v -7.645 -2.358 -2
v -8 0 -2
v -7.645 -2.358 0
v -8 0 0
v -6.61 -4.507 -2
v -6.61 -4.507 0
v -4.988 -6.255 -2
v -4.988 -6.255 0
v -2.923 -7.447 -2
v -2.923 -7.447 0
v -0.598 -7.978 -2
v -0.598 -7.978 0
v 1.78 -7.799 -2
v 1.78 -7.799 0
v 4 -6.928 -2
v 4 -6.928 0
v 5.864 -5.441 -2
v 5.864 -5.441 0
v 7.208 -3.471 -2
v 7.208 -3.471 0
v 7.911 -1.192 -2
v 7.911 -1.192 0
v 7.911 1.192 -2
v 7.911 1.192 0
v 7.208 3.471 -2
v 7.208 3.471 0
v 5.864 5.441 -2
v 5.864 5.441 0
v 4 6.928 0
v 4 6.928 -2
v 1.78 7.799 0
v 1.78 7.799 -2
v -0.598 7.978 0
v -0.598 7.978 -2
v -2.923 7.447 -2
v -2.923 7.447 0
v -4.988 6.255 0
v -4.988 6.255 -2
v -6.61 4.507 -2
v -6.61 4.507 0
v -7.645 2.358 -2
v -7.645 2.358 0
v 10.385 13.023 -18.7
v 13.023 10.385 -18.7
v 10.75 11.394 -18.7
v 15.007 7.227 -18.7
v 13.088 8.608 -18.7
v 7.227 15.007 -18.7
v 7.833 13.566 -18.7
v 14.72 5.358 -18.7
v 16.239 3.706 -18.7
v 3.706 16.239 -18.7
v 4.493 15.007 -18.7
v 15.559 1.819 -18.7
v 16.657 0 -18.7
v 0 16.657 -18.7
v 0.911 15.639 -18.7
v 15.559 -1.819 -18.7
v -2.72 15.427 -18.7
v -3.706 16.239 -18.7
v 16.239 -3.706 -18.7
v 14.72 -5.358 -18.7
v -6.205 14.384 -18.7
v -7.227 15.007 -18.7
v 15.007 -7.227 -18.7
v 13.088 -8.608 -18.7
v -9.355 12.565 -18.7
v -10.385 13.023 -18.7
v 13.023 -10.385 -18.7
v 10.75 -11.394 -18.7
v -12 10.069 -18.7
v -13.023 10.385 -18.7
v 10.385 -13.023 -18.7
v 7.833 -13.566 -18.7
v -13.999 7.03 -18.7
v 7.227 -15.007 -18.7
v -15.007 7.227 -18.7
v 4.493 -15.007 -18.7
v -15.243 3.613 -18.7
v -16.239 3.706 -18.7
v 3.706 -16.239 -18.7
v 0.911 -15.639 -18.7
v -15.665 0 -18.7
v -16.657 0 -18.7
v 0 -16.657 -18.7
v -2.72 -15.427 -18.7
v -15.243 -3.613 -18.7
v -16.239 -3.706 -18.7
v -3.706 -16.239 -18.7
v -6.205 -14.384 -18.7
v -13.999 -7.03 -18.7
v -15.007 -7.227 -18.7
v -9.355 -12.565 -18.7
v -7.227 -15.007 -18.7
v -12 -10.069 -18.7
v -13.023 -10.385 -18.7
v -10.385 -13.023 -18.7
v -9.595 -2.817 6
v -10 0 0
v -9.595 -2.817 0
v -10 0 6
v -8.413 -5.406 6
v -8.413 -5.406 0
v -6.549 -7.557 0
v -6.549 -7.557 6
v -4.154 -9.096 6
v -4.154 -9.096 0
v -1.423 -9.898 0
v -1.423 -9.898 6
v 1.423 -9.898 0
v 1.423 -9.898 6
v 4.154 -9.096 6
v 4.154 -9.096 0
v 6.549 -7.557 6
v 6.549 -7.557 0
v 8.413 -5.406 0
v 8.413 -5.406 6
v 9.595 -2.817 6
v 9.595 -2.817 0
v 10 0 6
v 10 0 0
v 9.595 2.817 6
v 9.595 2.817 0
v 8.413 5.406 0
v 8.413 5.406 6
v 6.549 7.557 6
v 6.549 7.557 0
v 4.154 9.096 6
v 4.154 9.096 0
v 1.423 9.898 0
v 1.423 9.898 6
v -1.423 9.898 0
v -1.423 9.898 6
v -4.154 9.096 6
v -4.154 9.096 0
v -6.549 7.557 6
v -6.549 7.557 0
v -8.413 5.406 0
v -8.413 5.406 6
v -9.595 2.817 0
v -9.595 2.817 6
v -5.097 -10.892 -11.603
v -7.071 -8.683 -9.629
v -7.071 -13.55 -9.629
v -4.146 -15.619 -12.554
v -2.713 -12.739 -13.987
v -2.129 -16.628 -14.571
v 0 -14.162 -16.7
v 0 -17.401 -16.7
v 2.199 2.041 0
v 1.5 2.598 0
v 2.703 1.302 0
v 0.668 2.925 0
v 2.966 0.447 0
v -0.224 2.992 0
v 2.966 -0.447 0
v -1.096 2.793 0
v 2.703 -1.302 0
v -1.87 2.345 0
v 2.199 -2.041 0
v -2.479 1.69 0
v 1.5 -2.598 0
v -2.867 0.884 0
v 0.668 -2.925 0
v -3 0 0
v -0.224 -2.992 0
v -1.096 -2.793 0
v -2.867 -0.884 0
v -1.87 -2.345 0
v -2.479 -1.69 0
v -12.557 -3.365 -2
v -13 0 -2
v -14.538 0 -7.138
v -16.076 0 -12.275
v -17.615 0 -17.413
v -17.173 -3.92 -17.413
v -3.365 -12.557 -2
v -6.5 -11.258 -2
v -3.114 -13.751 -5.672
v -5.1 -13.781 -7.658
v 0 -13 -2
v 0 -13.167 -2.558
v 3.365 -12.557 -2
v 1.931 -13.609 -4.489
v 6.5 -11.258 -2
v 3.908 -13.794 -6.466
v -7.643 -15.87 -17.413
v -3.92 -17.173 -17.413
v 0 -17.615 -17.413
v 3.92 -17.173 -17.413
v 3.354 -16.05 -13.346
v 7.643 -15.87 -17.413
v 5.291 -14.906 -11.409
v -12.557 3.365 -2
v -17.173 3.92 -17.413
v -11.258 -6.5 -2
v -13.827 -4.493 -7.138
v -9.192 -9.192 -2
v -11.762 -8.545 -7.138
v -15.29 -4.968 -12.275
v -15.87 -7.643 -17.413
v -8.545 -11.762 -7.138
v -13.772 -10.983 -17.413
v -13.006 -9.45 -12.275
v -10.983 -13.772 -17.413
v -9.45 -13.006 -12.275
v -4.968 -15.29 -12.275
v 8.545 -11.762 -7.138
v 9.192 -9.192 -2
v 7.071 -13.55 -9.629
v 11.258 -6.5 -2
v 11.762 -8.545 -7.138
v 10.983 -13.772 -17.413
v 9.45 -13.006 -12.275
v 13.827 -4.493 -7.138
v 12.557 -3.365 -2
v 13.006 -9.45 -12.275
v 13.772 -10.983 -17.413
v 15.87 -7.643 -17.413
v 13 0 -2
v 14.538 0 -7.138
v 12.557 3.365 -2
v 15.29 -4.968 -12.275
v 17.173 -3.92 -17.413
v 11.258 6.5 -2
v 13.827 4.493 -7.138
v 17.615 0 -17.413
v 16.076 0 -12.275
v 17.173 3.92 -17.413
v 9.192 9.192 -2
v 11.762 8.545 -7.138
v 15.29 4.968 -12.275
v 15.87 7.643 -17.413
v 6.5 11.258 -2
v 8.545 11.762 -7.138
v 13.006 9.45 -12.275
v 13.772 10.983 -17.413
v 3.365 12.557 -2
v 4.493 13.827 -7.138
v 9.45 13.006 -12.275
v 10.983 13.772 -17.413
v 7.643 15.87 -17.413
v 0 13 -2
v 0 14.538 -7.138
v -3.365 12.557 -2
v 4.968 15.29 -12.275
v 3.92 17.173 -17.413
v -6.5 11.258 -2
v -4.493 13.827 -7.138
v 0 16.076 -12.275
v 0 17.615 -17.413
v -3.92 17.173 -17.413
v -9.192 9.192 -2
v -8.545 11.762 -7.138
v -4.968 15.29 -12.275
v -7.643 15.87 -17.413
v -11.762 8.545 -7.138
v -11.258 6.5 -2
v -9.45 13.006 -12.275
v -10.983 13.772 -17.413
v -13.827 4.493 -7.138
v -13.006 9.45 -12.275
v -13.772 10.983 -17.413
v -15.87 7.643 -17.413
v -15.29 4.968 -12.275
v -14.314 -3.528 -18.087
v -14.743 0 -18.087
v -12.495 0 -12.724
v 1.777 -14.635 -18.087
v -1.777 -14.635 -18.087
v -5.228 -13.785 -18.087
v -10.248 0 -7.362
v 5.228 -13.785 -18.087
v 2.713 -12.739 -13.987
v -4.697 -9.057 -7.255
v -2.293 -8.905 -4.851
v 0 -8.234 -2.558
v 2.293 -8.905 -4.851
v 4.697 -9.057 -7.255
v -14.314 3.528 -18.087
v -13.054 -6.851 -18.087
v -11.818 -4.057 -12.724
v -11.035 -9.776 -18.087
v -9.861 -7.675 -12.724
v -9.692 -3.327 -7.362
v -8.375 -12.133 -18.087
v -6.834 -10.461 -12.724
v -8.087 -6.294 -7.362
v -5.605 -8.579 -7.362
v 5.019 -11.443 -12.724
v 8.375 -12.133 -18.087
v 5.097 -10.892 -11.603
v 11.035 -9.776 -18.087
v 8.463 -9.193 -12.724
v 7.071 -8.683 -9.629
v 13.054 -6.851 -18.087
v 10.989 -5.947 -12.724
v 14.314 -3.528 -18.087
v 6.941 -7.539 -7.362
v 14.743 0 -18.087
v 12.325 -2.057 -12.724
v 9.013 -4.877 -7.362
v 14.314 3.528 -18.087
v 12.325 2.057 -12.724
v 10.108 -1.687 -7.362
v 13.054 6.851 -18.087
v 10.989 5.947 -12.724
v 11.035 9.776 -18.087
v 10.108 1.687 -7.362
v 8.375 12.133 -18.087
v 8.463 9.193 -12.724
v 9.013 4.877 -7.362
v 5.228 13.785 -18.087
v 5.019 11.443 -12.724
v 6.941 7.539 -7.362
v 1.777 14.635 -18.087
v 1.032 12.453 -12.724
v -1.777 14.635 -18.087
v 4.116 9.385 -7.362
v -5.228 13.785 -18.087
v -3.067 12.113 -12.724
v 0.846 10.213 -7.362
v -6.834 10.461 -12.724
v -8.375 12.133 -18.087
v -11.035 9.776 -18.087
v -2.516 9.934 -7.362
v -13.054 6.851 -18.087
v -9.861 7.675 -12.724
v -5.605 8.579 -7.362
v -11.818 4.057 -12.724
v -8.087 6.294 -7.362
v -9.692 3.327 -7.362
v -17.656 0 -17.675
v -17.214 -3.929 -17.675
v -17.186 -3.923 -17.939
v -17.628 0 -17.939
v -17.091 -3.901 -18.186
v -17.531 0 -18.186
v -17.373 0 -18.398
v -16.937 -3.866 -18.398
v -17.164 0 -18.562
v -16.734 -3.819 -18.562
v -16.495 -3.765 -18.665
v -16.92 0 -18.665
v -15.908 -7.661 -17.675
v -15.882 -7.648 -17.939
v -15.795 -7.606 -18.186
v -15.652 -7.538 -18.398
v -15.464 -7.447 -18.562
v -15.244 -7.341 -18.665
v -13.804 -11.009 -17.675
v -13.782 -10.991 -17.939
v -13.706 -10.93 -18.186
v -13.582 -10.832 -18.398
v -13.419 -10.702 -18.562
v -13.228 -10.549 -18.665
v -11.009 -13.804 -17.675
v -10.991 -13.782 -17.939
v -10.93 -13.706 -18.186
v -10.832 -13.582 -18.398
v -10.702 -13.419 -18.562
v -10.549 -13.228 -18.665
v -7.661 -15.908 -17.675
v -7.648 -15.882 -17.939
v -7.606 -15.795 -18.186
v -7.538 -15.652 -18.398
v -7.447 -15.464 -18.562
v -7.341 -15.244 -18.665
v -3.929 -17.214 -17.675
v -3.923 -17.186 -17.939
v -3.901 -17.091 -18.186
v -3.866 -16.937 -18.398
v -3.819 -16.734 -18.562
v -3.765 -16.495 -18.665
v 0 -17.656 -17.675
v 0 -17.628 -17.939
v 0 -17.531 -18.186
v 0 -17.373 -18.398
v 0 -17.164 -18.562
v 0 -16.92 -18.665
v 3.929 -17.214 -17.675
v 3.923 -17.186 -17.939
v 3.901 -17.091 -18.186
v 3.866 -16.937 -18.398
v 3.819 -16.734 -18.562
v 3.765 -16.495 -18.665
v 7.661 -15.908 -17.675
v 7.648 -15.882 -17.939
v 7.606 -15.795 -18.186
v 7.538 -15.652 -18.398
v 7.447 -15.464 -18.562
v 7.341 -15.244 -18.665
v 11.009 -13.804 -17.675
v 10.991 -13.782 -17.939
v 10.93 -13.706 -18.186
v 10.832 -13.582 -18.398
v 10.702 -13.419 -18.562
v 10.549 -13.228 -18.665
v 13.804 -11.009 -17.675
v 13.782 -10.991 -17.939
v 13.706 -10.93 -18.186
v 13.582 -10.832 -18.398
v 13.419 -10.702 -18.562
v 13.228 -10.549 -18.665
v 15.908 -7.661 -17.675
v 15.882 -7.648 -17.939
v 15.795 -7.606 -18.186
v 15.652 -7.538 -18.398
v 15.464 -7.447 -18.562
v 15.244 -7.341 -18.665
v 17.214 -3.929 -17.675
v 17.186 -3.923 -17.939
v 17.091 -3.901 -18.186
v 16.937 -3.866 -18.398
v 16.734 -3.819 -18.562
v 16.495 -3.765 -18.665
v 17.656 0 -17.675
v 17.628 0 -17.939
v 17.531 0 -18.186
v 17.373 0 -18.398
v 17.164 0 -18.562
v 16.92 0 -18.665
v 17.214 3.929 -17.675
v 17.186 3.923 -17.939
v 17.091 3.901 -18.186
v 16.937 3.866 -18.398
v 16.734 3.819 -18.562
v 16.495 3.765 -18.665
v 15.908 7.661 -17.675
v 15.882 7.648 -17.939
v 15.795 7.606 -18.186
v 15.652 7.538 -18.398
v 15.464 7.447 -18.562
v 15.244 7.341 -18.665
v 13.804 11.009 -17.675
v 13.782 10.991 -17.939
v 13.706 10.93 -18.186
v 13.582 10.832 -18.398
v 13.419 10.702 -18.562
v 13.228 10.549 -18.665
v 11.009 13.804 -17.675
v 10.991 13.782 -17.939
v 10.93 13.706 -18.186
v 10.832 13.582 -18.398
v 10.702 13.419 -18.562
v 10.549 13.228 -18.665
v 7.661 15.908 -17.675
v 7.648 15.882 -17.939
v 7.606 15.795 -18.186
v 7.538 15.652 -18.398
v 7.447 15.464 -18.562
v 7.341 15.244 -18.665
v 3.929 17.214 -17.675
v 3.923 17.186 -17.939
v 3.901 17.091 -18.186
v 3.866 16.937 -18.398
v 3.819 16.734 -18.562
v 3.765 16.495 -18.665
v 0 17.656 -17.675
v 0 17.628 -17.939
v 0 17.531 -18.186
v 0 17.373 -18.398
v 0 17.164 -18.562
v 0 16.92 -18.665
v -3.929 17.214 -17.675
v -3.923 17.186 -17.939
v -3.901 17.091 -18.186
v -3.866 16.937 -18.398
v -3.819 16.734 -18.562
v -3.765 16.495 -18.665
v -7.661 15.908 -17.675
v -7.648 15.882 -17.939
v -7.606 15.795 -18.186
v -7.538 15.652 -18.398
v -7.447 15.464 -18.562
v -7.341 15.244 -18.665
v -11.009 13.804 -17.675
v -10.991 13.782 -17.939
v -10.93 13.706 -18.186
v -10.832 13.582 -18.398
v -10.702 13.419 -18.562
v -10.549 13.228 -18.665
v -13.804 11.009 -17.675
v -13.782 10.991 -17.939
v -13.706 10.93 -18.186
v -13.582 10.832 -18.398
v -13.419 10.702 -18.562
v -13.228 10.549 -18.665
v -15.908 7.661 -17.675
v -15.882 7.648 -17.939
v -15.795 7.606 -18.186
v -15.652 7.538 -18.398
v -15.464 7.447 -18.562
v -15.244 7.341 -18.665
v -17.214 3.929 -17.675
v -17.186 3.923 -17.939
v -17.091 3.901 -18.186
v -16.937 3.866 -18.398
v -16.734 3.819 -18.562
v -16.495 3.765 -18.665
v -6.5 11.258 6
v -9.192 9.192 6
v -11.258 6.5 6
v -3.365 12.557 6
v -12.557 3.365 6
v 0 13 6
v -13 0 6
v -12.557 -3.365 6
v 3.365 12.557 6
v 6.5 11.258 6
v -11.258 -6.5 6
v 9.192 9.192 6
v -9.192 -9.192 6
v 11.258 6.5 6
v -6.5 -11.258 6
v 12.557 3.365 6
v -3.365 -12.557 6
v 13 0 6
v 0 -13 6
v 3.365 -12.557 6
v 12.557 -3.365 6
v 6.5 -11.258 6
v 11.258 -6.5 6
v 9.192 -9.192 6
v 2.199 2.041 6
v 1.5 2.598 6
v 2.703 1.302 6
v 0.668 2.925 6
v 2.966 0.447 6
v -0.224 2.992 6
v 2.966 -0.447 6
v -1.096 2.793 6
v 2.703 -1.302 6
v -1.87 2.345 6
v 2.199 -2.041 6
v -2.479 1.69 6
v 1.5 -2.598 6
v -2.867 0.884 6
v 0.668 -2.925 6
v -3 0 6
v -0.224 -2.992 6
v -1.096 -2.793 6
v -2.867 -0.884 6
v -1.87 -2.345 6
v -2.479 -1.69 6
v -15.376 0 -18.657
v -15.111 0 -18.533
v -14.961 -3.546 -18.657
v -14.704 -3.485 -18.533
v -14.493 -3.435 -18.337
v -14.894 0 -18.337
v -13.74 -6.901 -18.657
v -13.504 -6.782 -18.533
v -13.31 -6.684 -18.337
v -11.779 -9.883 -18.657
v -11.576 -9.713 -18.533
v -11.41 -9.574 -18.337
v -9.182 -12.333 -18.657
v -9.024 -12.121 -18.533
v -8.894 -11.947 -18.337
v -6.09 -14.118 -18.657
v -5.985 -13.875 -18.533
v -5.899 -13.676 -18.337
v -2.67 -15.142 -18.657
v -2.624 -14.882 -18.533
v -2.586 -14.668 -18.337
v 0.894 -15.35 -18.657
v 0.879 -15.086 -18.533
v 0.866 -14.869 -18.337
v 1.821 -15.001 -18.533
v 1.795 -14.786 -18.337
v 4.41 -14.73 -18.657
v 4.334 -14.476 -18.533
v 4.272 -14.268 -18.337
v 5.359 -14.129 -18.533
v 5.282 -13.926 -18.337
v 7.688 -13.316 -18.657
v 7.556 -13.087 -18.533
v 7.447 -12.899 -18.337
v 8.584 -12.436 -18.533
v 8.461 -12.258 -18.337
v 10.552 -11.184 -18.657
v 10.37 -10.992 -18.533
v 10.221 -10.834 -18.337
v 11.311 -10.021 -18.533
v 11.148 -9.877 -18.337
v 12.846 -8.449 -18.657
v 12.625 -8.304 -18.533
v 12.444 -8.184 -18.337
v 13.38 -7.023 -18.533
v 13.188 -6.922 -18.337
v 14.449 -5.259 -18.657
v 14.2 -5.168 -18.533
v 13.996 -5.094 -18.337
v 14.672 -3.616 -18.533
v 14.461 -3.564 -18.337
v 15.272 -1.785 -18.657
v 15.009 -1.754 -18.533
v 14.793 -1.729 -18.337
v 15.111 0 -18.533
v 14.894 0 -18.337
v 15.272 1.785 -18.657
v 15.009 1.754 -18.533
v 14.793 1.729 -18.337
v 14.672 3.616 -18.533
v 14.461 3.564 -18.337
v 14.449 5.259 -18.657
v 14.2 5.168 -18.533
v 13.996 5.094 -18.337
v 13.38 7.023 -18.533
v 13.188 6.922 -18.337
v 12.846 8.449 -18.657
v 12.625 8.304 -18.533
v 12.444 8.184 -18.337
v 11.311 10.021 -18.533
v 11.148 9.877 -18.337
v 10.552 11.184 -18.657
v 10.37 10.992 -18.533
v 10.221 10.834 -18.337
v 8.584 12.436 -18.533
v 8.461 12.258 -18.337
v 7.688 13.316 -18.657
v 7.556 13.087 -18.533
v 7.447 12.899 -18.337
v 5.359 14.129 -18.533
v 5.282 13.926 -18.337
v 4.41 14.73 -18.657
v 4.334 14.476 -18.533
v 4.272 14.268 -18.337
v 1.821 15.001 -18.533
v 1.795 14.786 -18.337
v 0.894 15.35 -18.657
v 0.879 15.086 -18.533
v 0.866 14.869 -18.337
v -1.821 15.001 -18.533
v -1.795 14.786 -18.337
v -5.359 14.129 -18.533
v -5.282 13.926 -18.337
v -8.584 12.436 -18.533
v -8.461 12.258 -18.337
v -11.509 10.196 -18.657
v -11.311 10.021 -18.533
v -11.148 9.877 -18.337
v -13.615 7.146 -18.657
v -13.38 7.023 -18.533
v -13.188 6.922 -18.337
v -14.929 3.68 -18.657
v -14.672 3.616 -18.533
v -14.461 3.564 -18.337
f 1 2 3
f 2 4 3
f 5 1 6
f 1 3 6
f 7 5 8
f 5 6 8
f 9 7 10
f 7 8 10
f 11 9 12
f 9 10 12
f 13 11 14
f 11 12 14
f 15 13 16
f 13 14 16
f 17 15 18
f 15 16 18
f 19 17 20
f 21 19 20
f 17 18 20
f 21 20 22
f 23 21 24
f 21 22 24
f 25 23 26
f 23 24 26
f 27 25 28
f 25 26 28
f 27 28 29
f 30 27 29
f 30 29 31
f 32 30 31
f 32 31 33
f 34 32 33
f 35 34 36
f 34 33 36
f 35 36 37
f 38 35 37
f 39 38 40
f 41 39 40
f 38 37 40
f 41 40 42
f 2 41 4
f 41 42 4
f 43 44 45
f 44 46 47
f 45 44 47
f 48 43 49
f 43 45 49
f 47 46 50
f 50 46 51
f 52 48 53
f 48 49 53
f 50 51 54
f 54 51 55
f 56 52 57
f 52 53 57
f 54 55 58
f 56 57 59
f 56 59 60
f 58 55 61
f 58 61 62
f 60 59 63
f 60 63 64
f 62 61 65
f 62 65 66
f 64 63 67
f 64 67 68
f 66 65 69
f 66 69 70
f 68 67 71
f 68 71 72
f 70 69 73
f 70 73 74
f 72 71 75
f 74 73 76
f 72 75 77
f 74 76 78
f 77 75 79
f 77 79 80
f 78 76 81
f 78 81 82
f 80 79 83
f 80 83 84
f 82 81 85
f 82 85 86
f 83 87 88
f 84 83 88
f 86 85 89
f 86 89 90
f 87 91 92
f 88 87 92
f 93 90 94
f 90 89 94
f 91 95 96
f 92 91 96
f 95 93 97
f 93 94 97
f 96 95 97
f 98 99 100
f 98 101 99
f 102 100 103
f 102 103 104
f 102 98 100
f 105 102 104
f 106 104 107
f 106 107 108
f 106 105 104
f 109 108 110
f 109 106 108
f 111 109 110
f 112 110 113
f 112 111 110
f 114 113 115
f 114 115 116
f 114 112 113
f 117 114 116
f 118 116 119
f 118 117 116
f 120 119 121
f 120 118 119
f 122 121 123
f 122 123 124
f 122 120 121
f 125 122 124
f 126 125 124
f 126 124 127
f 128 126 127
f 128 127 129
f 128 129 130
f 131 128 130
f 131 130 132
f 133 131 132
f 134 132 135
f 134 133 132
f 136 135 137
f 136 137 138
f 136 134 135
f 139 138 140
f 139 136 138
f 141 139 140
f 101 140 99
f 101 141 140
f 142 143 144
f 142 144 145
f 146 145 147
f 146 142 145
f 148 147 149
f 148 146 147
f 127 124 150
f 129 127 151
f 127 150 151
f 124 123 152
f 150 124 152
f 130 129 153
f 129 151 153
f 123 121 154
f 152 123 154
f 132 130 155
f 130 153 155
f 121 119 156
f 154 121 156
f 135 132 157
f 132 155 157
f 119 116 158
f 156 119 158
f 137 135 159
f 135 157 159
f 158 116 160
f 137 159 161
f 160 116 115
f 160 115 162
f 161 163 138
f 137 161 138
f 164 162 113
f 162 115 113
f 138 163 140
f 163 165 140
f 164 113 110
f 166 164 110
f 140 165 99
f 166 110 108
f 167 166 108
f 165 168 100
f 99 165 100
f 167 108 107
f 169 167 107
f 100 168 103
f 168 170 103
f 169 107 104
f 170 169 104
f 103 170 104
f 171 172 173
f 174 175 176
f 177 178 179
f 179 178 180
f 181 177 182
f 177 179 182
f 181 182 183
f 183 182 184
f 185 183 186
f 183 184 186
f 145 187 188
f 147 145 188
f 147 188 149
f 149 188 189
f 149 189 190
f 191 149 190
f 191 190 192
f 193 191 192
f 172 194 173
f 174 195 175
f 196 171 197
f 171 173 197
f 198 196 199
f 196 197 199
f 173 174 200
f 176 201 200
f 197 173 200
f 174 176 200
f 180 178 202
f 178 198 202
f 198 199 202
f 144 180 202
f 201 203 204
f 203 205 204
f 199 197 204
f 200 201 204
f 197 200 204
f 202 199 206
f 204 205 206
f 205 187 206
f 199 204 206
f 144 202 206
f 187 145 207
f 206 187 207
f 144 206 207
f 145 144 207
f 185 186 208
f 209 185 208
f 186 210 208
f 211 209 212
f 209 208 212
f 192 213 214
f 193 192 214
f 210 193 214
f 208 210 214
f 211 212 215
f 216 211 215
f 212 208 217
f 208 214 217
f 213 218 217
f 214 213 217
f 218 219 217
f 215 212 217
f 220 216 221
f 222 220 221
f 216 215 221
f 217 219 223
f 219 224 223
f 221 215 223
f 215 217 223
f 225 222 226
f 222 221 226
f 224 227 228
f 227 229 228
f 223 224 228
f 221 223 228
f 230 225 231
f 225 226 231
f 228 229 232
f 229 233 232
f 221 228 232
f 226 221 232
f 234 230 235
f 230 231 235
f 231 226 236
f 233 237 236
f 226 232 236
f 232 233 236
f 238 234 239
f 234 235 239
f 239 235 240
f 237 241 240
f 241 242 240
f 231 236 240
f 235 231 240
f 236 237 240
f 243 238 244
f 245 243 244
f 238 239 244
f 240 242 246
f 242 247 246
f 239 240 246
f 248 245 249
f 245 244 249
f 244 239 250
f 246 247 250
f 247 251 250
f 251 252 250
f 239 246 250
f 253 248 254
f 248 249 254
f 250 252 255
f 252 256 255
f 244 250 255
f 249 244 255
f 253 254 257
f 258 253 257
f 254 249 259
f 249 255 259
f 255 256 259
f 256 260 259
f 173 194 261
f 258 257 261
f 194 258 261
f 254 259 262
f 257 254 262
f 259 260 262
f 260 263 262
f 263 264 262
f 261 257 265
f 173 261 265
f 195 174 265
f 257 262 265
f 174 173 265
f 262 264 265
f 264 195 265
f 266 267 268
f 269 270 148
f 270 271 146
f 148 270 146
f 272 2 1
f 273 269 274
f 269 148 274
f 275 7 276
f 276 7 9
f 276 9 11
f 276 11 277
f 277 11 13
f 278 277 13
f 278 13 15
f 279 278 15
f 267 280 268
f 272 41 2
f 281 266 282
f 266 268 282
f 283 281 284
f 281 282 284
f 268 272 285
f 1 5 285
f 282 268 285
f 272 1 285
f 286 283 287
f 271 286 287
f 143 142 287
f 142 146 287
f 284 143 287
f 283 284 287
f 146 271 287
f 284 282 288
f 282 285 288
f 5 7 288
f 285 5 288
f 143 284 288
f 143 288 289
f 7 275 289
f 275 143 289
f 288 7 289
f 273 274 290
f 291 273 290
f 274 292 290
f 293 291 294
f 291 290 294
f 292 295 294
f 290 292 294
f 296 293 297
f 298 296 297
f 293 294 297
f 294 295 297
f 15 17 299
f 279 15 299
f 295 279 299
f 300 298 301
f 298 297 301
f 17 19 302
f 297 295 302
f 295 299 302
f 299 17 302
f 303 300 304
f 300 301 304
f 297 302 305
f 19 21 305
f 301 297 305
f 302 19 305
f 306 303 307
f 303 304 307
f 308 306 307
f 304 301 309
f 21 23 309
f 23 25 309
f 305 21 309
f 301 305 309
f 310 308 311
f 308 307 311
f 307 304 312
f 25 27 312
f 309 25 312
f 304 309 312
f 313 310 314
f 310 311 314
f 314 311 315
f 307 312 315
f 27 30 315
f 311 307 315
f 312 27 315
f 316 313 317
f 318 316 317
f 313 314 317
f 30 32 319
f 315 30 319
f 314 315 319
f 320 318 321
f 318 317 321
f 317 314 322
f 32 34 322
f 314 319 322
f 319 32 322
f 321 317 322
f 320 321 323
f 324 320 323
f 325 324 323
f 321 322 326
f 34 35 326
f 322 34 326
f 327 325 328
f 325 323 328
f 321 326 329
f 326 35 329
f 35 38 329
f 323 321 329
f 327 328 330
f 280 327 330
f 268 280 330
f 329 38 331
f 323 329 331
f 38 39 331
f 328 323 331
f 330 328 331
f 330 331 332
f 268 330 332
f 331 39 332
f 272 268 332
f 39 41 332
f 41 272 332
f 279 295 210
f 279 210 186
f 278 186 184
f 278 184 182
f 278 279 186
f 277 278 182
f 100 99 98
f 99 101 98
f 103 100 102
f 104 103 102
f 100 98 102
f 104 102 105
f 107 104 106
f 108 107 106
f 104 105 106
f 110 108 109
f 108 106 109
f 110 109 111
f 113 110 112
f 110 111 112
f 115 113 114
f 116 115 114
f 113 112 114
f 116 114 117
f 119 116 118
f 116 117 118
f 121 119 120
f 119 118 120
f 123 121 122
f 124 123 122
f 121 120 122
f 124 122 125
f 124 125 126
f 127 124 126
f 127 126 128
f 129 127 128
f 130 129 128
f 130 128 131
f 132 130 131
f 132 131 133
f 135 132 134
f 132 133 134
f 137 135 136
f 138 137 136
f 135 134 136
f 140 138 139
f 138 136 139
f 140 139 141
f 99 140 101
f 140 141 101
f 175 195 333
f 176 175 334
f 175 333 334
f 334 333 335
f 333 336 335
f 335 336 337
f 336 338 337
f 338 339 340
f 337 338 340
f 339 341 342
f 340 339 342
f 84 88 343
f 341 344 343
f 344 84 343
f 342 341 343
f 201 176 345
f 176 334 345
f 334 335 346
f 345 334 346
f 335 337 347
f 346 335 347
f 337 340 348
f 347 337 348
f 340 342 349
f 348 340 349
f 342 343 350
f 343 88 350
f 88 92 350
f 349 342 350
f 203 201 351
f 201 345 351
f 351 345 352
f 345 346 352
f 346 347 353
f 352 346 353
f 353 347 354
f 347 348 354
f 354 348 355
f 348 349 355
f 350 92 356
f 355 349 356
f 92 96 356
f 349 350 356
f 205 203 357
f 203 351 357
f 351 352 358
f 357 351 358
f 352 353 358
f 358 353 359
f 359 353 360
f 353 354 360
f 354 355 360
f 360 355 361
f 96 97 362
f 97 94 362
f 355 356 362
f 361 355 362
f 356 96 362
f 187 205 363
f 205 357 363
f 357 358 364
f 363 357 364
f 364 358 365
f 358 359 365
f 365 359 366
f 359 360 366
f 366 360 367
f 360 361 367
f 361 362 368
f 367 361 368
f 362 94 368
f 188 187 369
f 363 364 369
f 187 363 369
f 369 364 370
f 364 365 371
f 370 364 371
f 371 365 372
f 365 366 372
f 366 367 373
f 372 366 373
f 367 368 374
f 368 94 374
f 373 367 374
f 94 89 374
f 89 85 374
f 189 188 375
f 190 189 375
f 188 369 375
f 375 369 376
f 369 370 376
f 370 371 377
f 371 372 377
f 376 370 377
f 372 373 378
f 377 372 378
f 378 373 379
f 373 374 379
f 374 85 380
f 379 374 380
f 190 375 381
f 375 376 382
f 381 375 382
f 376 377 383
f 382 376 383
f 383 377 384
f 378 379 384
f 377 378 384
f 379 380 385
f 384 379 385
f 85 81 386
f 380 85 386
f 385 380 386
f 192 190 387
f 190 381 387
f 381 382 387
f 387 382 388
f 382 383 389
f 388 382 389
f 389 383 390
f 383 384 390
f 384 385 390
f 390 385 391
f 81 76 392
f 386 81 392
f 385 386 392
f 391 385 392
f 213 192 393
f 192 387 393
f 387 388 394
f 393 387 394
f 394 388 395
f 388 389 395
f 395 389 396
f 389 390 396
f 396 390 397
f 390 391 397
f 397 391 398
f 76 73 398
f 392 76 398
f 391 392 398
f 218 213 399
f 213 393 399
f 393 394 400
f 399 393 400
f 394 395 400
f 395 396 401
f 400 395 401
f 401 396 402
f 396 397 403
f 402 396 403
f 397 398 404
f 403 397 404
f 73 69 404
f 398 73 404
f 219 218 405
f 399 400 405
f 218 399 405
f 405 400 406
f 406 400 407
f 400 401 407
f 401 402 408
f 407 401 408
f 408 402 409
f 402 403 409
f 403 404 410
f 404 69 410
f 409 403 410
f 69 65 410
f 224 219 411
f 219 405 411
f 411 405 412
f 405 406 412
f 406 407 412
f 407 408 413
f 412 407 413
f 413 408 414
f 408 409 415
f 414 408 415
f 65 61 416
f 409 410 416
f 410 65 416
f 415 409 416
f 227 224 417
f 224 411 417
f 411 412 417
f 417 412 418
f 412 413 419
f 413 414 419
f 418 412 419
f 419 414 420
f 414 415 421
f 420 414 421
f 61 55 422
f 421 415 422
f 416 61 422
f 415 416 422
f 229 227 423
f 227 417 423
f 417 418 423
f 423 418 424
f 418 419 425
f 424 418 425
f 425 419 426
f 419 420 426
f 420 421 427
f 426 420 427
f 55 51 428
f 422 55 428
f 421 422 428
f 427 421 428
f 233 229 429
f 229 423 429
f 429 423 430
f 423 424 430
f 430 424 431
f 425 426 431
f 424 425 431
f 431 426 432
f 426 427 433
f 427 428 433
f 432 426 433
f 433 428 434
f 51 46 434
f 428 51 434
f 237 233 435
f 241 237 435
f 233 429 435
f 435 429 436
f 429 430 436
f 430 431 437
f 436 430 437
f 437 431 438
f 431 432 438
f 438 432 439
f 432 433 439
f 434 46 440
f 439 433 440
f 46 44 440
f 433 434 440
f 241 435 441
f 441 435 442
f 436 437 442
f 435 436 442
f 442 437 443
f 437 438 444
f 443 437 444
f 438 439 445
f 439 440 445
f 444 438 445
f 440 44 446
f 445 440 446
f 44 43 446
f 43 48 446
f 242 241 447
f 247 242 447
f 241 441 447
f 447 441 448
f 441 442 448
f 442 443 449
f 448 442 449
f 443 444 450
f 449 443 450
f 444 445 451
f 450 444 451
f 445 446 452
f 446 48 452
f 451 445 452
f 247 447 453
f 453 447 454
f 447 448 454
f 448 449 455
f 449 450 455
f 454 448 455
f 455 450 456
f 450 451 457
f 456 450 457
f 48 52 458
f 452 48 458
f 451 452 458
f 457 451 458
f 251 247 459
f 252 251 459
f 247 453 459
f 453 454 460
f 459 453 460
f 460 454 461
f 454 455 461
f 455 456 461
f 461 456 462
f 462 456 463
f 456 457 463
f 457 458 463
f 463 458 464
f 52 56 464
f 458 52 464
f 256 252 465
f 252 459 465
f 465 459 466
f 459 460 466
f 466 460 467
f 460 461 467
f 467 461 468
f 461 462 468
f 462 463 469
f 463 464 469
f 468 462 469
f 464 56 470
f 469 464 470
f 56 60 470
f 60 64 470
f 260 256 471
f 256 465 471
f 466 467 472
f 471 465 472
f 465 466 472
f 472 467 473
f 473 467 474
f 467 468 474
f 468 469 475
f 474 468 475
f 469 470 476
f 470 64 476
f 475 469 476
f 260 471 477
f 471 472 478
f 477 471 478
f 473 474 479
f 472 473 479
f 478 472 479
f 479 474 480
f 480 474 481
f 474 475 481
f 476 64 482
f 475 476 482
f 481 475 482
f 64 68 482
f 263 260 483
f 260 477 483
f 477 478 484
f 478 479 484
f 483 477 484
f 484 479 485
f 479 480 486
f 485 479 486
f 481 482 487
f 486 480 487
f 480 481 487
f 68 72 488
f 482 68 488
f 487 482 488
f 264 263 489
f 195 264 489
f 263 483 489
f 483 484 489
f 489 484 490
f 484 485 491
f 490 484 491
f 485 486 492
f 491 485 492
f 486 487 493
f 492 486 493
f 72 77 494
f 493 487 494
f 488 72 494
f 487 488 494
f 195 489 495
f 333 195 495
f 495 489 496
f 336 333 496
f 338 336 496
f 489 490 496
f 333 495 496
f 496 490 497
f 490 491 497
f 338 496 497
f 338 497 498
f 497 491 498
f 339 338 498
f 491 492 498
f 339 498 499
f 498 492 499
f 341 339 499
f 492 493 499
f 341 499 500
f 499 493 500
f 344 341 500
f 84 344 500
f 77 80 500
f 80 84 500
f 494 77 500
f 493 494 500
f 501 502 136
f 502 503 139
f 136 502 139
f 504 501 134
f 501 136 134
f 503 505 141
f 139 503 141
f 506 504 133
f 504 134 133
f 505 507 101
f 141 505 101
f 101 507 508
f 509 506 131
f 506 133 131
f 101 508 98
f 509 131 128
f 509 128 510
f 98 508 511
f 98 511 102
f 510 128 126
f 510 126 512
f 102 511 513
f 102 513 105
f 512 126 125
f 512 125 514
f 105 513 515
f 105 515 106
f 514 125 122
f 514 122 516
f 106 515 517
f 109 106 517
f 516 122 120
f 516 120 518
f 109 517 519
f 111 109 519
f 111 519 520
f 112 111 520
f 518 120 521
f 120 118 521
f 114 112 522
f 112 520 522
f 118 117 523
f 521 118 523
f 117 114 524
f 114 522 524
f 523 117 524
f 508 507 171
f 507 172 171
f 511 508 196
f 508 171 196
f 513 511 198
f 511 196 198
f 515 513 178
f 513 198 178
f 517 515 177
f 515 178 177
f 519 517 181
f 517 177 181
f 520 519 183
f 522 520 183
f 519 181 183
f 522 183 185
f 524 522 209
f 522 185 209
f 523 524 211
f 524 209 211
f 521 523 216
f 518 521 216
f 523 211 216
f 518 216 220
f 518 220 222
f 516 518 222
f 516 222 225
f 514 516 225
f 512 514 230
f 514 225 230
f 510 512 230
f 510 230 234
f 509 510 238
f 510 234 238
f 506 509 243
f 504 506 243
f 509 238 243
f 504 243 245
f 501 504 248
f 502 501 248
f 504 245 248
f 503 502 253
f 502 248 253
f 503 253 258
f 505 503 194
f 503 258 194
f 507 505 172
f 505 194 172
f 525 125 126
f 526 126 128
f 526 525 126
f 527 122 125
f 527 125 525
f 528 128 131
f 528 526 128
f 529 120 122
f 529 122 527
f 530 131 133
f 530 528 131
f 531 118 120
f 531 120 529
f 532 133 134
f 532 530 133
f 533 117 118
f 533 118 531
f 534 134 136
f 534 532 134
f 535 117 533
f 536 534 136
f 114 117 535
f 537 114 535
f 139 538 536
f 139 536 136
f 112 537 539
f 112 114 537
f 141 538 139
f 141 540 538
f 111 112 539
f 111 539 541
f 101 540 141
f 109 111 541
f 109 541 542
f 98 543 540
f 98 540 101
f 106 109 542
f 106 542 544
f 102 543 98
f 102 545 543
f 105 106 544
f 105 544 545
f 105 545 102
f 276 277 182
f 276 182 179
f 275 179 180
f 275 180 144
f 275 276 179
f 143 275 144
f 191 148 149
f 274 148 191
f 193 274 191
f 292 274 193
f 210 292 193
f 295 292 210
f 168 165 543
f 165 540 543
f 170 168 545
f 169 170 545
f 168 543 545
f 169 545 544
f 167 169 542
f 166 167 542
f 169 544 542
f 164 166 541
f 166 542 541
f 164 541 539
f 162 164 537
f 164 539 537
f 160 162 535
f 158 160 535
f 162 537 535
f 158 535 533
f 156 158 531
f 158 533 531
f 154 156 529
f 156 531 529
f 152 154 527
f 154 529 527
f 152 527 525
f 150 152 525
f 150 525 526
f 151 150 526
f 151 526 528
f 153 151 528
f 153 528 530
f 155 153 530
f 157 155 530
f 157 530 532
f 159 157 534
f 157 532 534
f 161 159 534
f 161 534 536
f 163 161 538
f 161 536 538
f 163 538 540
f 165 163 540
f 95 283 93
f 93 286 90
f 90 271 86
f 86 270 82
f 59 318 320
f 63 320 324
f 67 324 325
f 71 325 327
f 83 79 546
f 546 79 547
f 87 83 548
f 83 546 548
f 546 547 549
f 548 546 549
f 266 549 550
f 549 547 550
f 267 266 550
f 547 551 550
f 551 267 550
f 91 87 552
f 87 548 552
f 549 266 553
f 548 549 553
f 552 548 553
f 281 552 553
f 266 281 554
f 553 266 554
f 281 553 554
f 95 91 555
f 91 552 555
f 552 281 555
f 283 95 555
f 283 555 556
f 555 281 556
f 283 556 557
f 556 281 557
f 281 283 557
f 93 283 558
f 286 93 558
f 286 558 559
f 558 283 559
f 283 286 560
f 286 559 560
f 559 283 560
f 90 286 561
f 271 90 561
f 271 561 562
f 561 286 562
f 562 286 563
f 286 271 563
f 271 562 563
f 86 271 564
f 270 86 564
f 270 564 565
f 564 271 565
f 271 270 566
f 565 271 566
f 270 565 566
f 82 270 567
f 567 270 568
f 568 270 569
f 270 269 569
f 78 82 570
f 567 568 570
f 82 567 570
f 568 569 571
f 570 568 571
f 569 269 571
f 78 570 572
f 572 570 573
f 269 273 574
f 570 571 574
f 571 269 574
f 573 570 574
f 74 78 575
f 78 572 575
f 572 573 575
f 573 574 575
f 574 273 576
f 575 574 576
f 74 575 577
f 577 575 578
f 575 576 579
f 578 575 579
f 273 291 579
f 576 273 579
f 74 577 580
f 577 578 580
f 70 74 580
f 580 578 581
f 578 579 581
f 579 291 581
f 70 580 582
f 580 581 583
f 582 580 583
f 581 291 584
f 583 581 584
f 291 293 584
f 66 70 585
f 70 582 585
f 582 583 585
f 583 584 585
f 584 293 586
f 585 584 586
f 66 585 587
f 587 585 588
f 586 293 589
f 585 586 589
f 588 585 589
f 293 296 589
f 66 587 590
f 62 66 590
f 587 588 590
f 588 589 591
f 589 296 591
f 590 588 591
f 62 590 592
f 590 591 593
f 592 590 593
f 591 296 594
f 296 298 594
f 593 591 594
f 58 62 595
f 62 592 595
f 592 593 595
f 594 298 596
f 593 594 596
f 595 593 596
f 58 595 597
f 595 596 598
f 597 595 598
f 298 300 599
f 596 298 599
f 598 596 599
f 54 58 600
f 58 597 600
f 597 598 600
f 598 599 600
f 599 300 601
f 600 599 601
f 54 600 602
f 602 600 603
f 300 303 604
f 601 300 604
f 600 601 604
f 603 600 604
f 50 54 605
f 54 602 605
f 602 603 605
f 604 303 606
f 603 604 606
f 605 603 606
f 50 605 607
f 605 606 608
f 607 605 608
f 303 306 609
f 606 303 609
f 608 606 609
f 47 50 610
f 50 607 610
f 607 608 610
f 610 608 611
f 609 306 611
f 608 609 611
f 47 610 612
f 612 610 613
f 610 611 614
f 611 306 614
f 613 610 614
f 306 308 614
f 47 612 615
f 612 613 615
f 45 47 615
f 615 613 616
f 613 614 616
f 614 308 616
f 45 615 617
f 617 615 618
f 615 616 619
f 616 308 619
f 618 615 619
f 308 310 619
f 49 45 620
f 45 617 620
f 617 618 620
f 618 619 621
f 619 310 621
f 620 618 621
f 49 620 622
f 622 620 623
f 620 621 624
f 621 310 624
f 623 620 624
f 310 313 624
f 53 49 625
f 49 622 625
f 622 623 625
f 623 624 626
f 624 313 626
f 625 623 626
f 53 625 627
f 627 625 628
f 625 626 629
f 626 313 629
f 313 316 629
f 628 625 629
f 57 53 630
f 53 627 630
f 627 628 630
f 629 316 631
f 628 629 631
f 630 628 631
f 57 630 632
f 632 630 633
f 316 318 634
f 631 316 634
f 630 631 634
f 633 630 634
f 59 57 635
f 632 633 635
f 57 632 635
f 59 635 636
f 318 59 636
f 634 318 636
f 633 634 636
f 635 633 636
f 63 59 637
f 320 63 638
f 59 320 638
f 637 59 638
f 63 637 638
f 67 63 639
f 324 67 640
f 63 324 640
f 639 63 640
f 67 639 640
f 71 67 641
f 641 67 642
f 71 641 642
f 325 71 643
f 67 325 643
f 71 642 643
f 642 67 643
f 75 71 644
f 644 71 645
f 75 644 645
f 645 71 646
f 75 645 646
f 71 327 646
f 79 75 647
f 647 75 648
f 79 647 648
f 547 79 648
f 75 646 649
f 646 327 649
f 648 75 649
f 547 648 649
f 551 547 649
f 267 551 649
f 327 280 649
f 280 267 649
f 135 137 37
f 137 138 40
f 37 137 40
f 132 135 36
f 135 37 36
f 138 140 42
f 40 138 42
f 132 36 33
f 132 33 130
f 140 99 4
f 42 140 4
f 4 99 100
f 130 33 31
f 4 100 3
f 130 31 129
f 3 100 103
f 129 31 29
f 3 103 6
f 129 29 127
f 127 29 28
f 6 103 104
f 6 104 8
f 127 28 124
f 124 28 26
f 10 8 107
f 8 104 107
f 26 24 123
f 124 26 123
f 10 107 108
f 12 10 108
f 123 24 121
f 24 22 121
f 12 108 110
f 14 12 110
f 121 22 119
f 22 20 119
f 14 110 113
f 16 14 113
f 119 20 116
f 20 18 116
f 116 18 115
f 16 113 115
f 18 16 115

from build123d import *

# Parameters (mm, degrees)
F2_W     = 7
F2_H     = 6
F6_R     = 6.25
F7_DEPTH = 30
F9_DEPTH = 80


with BuildPart() as f3:
    # F2 (on Front) → F3 (revolve)
    with BuildSketch(Plane.XZ):
        with Locations((-6.5, 3)):
            Rectangle(F2_W, F2_H)
    revolve(axis=Axis((0, 0, 7.569397334), (0, 0, 1)))

    # F6 (on face) → F7 (cut)
    with BuildSketch(Plane.XY.offset(6)):
        Circle(F6_R)
    extrude(amount=F7_DEPTH, mode=Mode.SUBTRACT)


with BuildPart() as f5:
    # F4 (on Front) → F5 (revolve)
    with BuildSketch(Plane.XZ):
        with BuildLine():
            Line((-8, 0), (-10, 0))
            Line((-10, 0), (-10, 6))
            Line((-10, 6), (-13, 6))
            Line((-13, 6), (-13, -2))
            Line((-13, -2), (-17.6147240826, -17.4131784359))
            ThreePointArc((-17.6147240826, -17.4131784359), (-17.4588689647, -18.2971509172), (-16.6567400585, -18.7))
            Line((-16.6567400585, -18.7), (-15.6651337218, -18.7))
            ThreePointArc((-15.6651337218, -18.7), (-15.1113174927, -18.532638928), (-14.7428758192, -18.0865751688))
            Line((-14.7428758192, -18.0865751688), (-8, -2))
            Line((-8, -2), (-8, 0))
        make_face()
    revolve(axis=Axis((0, 0, 7.569397334), (0, 0, 1)))

    # F8 (on Front) → F9 (cut)
    with BuildSketch(Plane.XZ):
        Polygon((7.0710678119, -9.6289321881), (0, -2.5578643763), (-7.0710678119, -9.6289321881), (0, -16.7), align=None)
    extrude(amount=F9_DEPTH, mode=Mode.SUBTRACT)


solid = Compound([f3.part, f5.part])
